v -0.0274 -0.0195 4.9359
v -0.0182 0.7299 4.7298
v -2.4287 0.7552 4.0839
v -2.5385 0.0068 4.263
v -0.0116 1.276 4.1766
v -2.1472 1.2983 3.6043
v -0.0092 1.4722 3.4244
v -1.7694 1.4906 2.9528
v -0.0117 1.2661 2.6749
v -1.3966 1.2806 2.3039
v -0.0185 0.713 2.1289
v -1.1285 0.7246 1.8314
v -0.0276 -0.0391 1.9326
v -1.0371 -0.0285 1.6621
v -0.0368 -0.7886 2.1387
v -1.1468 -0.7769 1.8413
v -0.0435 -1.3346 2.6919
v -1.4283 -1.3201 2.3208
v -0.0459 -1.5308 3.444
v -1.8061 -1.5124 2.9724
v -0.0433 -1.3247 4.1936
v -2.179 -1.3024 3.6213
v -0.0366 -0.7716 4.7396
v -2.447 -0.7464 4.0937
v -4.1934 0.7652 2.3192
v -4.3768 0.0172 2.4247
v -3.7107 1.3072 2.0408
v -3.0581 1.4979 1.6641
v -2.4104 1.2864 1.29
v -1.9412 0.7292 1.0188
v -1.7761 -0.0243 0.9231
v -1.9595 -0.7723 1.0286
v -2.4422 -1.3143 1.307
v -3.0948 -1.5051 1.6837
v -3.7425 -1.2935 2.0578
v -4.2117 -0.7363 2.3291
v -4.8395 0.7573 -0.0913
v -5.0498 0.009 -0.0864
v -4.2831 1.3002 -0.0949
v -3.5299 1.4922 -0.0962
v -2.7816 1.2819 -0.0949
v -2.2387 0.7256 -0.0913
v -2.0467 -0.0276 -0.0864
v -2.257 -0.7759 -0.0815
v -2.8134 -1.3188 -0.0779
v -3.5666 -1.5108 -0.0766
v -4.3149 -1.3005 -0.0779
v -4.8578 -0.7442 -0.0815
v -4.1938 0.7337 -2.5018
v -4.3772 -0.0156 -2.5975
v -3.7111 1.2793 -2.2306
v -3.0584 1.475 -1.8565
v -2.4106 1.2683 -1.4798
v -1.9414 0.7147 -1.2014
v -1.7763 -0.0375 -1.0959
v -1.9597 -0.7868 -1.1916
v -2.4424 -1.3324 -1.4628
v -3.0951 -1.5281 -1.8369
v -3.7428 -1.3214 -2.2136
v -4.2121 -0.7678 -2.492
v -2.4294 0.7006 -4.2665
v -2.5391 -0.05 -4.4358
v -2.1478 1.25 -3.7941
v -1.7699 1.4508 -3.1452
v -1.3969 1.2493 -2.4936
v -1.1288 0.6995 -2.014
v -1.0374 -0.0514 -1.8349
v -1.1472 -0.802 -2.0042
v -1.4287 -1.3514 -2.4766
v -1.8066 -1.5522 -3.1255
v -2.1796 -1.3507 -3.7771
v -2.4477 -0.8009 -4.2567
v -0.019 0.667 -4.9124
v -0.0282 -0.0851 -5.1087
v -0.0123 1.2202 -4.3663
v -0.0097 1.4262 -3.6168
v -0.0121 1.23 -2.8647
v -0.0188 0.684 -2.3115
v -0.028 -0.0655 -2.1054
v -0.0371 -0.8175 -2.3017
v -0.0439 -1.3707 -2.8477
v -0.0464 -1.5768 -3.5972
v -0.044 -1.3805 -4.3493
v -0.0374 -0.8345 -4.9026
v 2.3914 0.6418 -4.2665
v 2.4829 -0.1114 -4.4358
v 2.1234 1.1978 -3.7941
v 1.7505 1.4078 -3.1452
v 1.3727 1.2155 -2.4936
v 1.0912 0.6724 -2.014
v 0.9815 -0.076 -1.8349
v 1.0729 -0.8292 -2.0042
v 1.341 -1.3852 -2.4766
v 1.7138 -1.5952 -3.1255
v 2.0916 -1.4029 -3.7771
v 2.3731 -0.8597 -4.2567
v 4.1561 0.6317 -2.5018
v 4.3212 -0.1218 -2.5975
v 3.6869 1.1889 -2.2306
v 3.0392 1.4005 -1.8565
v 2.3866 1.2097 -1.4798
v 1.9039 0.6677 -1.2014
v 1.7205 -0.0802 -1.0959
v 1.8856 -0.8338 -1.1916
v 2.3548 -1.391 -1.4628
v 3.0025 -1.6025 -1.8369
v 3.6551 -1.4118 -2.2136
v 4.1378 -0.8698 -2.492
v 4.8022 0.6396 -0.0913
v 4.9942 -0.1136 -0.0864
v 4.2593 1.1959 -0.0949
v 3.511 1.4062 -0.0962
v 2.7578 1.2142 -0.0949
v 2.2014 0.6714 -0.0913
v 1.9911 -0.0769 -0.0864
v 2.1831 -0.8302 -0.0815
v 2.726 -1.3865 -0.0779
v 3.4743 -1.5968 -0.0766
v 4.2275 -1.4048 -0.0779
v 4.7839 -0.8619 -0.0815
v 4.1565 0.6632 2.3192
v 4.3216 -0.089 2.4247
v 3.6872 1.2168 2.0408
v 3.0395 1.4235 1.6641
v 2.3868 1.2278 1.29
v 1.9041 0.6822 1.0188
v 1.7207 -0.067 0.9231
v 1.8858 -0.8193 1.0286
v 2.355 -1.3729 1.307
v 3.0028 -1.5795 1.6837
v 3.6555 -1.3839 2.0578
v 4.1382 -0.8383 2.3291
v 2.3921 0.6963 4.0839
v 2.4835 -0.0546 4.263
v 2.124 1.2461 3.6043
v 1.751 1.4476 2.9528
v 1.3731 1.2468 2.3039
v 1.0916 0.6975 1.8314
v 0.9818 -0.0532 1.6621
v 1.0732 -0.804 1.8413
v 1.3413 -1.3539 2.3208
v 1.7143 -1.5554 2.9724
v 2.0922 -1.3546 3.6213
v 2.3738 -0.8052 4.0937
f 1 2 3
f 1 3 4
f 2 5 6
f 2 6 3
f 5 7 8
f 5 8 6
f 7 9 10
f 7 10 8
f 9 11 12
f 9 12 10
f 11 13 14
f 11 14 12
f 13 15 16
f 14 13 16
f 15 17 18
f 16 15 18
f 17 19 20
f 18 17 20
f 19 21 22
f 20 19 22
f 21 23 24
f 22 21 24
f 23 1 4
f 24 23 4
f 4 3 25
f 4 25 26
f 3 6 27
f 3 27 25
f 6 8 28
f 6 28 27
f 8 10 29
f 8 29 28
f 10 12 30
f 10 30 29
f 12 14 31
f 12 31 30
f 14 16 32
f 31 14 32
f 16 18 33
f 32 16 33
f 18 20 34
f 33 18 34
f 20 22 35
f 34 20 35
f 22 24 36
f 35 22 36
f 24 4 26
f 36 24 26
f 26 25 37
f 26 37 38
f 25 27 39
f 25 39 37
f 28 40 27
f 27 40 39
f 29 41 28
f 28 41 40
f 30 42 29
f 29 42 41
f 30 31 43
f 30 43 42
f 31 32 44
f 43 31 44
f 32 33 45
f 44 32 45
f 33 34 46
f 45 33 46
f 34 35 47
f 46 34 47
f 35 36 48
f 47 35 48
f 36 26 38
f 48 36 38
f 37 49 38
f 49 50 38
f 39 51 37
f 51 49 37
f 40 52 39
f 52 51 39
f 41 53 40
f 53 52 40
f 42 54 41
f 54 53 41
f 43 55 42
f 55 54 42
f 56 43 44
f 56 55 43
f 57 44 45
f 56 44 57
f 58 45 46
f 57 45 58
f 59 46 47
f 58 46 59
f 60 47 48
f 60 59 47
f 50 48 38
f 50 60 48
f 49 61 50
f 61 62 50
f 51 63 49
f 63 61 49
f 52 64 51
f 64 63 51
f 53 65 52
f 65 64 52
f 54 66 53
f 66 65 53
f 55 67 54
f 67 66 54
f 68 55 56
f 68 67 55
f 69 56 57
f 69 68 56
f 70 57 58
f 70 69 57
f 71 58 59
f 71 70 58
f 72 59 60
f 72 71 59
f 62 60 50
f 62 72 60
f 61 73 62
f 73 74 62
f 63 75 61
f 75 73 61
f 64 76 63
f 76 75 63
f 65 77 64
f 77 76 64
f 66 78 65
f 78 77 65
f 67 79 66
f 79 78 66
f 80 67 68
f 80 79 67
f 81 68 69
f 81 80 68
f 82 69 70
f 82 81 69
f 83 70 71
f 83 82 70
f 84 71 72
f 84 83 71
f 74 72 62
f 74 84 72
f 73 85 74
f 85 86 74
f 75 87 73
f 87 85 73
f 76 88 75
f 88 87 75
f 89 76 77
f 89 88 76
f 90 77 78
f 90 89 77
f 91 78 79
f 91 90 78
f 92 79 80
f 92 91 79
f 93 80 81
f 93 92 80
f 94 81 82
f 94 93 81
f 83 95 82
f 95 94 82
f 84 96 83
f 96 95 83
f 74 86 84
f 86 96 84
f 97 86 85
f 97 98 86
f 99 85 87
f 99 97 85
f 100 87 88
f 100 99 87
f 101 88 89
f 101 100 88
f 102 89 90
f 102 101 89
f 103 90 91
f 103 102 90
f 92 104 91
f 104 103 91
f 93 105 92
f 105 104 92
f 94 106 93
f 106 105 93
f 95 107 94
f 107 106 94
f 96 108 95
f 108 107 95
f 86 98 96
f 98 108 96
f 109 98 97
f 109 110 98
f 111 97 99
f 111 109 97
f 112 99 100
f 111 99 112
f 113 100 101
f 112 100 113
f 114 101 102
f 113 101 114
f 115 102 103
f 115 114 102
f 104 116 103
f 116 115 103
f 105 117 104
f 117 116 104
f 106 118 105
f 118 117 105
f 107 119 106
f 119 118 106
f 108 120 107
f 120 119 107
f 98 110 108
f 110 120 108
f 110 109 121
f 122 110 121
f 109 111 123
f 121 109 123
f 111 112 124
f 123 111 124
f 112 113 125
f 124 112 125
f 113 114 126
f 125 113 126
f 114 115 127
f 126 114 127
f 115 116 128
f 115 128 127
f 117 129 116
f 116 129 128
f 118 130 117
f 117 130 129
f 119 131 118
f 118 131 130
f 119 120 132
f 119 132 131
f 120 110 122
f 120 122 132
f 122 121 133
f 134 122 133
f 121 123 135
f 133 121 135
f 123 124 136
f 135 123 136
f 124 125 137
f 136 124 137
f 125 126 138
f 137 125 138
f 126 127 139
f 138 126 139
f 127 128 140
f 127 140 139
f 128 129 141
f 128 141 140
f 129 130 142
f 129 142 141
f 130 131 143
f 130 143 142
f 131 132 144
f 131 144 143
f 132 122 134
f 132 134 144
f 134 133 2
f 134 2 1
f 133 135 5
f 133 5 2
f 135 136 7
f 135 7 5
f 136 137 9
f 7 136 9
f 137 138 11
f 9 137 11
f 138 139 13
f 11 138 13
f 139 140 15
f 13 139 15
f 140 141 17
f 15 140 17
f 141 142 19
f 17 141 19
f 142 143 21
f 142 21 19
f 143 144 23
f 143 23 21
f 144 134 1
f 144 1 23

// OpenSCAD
intersection() {
translate([-5.991204, -1.797360, -6.000000])
cube(size = [11.982408, 3.594720, 12.000000], center = false);
union() {
// Begin.
union() {
translate([-0.0278, -0.05229, -0.08639])
rotate([0, 0.374141, 89.3004])
rotate([0, 90, 0])
rotate_extrude($fn = 12)
translate([3.52071, 0, 0])
circle(r = 1.50166, $fn = 12);

translate([-0.0278, -0.05229, -0.08639])
rotate([0, 0.374141, 89.3004])
rotate([0, 90, 0])
rotate_extrude($fn = 12)
translate([3.52071, 0, 0])
circle(r = 1.50166, $fn = 12);
}
// End.
}
}
